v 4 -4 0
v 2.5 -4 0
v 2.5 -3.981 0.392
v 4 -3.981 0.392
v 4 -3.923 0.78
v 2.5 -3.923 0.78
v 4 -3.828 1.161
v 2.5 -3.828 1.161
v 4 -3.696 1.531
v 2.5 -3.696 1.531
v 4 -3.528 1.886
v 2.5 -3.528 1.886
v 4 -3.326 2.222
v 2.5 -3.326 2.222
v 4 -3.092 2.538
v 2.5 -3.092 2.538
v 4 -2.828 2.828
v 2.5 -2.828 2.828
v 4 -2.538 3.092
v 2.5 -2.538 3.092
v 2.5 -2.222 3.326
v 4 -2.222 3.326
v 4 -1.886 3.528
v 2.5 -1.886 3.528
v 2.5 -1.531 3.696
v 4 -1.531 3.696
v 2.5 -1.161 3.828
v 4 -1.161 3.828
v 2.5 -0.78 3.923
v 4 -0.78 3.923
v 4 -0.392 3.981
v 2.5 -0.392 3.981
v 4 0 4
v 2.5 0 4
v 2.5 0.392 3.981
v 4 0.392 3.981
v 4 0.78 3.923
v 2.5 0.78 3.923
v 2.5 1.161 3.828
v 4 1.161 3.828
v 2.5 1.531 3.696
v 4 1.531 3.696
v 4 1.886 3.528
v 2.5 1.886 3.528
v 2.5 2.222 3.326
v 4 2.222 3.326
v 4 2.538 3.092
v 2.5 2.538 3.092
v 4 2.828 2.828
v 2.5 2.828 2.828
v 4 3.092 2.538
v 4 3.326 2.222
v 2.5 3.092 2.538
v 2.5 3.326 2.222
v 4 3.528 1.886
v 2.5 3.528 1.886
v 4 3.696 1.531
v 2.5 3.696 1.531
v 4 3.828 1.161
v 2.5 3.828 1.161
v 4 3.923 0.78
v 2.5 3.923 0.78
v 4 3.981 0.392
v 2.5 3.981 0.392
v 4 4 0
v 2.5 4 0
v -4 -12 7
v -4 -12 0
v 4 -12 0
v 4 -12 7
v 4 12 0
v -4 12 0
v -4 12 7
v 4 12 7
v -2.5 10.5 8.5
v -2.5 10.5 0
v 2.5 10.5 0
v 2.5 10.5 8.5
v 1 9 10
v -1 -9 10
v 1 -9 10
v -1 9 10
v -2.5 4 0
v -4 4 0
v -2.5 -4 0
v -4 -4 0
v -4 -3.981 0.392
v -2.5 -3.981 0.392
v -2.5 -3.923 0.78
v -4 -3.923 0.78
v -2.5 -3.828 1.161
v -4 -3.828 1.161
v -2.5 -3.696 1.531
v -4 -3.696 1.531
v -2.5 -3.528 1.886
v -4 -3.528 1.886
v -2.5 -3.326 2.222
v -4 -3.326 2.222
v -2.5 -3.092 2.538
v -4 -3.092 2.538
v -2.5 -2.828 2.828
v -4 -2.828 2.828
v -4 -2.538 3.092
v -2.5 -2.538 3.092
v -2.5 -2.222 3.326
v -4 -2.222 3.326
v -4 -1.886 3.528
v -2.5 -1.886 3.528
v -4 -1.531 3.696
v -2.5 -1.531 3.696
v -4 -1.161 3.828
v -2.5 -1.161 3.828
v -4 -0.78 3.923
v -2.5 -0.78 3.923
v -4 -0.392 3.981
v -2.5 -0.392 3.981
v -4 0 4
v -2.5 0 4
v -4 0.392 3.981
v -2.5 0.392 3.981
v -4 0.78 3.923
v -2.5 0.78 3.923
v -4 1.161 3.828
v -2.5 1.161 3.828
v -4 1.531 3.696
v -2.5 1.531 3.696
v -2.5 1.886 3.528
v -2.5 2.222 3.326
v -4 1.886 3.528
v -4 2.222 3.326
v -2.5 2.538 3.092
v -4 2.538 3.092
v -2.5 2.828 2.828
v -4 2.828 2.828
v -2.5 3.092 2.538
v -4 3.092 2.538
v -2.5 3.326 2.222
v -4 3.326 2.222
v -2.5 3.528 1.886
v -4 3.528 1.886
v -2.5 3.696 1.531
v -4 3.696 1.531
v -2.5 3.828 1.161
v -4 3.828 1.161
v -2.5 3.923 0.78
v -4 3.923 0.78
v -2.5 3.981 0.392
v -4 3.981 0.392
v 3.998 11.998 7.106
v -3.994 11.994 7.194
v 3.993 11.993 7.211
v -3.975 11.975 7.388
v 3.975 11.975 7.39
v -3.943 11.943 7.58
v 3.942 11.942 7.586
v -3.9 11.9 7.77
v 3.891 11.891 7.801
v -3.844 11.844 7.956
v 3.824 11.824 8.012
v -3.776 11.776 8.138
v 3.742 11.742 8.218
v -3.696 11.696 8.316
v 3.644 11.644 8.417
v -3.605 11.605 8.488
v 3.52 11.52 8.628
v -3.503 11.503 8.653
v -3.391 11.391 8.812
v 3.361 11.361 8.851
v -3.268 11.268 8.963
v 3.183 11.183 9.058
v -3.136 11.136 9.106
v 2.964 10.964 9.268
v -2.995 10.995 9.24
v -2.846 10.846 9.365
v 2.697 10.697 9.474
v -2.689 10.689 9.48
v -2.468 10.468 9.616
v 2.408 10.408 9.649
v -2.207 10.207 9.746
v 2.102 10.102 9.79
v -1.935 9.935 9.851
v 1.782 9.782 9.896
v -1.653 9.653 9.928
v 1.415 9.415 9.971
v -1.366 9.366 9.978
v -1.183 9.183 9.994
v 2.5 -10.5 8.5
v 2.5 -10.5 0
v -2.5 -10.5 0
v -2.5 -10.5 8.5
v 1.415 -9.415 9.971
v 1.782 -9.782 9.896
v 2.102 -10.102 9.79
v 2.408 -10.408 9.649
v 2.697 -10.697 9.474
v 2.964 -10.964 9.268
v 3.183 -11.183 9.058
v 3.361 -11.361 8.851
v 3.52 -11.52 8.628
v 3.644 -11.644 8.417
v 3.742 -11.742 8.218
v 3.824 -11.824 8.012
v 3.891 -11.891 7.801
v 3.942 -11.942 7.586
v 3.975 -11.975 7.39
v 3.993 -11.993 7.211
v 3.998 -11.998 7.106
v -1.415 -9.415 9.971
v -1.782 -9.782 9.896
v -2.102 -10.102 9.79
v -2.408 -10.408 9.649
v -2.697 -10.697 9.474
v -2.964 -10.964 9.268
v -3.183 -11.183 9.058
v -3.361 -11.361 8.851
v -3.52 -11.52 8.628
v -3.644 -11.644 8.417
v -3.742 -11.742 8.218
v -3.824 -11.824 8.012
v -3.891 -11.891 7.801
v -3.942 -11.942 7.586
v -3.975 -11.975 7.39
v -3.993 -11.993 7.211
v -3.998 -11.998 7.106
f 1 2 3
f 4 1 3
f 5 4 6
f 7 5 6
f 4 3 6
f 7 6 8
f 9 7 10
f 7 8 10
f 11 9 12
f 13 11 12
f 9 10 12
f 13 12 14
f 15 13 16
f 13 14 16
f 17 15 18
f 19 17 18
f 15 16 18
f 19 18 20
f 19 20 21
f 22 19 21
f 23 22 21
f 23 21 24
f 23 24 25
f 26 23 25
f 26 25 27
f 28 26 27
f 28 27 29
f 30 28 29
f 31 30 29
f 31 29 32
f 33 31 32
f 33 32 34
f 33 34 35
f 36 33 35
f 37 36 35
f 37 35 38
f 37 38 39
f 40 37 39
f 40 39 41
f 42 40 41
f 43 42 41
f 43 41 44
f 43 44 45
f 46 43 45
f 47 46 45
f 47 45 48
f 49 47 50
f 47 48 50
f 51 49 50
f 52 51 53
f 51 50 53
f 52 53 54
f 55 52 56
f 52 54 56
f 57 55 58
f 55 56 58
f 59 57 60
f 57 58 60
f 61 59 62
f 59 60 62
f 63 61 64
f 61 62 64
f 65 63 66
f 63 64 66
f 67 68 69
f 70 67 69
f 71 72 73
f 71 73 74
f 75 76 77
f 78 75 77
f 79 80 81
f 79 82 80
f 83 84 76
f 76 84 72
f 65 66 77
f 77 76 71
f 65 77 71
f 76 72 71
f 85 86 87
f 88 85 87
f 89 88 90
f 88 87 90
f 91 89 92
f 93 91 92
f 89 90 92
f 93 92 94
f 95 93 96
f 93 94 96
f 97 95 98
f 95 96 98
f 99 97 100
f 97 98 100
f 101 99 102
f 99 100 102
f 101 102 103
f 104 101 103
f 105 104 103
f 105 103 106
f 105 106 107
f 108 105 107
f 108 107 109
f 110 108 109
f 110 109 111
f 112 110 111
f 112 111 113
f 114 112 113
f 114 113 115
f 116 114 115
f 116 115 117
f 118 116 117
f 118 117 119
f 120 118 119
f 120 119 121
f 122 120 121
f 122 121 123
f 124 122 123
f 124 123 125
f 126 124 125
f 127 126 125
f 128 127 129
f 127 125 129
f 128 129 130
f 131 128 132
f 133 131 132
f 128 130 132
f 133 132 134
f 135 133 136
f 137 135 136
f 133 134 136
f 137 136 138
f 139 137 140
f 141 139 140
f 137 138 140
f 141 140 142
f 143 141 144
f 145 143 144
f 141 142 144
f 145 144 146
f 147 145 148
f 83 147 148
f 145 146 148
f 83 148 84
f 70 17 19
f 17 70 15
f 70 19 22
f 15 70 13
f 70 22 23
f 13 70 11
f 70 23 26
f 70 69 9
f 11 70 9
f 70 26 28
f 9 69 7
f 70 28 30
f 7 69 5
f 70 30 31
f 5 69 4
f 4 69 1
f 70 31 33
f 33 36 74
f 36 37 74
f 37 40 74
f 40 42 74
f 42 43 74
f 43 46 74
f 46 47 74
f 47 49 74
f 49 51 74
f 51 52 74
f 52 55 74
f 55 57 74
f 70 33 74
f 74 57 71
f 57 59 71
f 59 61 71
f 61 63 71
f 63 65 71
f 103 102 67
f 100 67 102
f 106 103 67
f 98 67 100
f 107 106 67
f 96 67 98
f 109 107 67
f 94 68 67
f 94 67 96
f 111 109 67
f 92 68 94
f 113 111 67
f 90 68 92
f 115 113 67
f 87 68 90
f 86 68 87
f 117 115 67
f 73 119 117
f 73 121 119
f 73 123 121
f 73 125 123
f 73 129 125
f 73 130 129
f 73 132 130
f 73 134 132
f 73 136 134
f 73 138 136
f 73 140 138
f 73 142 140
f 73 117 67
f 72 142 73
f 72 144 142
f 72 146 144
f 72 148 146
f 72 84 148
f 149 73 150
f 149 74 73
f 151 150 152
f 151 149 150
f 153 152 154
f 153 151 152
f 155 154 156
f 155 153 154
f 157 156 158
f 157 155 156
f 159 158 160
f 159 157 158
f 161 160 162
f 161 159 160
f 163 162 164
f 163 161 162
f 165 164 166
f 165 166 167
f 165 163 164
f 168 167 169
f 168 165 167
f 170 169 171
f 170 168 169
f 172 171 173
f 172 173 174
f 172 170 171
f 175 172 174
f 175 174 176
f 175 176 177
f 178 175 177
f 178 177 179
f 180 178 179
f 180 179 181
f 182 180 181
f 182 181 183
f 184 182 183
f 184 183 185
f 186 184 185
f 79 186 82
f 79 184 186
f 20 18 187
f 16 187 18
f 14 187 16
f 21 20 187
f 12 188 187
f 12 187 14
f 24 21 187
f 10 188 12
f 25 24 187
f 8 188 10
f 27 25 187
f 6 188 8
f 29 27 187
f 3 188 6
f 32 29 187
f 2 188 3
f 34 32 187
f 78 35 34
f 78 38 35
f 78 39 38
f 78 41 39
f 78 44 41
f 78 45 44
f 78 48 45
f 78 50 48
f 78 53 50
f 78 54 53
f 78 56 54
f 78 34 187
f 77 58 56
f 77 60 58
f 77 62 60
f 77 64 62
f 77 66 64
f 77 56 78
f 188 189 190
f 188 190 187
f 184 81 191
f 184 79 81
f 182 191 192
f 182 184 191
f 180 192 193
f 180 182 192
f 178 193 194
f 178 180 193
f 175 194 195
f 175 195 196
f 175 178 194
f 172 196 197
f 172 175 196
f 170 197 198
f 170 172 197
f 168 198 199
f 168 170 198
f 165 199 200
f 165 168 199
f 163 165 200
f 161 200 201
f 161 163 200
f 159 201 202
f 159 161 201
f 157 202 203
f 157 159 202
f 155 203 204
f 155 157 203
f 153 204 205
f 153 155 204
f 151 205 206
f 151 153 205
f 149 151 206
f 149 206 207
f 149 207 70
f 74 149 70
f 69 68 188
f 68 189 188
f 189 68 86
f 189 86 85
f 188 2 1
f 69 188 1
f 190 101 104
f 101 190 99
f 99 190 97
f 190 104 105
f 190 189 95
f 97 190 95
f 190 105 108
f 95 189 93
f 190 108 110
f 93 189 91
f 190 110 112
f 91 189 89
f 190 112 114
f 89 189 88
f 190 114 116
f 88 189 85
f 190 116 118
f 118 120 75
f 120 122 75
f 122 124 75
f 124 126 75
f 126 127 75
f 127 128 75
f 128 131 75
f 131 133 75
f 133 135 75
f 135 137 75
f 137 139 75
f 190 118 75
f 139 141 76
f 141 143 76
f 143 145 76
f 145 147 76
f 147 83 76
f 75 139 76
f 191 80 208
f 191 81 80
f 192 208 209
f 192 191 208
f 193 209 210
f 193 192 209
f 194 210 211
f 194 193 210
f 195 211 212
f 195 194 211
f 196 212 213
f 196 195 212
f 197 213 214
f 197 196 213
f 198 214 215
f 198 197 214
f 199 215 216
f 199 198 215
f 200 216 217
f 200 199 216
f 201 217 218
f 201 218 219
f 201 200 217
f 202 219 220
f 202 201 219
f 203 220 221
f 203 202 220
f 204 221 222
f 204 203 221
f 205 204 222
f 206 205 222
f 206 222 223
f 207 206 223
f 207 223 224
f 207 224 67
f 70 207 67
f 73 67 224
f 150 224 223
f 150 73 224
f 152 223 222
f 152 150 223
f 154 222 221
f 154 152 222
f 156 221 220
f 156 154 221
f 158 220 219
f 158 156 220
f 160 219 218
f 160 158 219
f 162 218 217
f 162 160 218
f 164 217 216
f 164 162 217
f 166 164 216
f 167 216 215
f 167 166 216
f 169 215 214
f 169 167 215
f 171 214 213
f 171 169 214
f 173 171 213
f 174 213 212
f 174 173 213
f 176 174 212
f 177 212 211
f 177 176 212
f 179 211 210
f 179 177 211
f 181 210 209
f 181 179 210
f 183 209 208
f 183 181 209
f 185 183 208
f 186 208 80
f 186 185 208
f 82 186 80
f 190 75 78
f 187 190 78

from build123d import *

# Parameters (mm, degrees)
F0_W     = 8
F0_H     = 24
F1_DEPTH = 10
F2_T     = -1.5
F4_D     = 8
F5_R     = 3


with BuildPart() as f1:
    # F0 (on Top) → F1 (new body)
    with BuildSketch(Plane.XY):
        Rectangle(F0_W, F0_H)
    extrude(amount=F1_DEPTH)

    # F2
    f2_openings = [f1.faces().sort_by_distance(p)[0] for p in [
        (0, 0, 0),
    ]]
    offset(amount=F2_T, openings=f2_openings)

    # F4 (through all)
    with Locations(Plane.YZ.offset(4)):
        with Locations((0, 0)):
            Hole(F4_D / 2)

    # F5
    f5_edges = [f1.edges().sort_by_distance(p)[0] for p in [
        (0, -12, 10),
        (4, 0, 10),
        (0, 12, 10),
        (-4, 0, 10),
    ]]
    fillet(f5_edges, radius=F5_R)


solid = f1.part
